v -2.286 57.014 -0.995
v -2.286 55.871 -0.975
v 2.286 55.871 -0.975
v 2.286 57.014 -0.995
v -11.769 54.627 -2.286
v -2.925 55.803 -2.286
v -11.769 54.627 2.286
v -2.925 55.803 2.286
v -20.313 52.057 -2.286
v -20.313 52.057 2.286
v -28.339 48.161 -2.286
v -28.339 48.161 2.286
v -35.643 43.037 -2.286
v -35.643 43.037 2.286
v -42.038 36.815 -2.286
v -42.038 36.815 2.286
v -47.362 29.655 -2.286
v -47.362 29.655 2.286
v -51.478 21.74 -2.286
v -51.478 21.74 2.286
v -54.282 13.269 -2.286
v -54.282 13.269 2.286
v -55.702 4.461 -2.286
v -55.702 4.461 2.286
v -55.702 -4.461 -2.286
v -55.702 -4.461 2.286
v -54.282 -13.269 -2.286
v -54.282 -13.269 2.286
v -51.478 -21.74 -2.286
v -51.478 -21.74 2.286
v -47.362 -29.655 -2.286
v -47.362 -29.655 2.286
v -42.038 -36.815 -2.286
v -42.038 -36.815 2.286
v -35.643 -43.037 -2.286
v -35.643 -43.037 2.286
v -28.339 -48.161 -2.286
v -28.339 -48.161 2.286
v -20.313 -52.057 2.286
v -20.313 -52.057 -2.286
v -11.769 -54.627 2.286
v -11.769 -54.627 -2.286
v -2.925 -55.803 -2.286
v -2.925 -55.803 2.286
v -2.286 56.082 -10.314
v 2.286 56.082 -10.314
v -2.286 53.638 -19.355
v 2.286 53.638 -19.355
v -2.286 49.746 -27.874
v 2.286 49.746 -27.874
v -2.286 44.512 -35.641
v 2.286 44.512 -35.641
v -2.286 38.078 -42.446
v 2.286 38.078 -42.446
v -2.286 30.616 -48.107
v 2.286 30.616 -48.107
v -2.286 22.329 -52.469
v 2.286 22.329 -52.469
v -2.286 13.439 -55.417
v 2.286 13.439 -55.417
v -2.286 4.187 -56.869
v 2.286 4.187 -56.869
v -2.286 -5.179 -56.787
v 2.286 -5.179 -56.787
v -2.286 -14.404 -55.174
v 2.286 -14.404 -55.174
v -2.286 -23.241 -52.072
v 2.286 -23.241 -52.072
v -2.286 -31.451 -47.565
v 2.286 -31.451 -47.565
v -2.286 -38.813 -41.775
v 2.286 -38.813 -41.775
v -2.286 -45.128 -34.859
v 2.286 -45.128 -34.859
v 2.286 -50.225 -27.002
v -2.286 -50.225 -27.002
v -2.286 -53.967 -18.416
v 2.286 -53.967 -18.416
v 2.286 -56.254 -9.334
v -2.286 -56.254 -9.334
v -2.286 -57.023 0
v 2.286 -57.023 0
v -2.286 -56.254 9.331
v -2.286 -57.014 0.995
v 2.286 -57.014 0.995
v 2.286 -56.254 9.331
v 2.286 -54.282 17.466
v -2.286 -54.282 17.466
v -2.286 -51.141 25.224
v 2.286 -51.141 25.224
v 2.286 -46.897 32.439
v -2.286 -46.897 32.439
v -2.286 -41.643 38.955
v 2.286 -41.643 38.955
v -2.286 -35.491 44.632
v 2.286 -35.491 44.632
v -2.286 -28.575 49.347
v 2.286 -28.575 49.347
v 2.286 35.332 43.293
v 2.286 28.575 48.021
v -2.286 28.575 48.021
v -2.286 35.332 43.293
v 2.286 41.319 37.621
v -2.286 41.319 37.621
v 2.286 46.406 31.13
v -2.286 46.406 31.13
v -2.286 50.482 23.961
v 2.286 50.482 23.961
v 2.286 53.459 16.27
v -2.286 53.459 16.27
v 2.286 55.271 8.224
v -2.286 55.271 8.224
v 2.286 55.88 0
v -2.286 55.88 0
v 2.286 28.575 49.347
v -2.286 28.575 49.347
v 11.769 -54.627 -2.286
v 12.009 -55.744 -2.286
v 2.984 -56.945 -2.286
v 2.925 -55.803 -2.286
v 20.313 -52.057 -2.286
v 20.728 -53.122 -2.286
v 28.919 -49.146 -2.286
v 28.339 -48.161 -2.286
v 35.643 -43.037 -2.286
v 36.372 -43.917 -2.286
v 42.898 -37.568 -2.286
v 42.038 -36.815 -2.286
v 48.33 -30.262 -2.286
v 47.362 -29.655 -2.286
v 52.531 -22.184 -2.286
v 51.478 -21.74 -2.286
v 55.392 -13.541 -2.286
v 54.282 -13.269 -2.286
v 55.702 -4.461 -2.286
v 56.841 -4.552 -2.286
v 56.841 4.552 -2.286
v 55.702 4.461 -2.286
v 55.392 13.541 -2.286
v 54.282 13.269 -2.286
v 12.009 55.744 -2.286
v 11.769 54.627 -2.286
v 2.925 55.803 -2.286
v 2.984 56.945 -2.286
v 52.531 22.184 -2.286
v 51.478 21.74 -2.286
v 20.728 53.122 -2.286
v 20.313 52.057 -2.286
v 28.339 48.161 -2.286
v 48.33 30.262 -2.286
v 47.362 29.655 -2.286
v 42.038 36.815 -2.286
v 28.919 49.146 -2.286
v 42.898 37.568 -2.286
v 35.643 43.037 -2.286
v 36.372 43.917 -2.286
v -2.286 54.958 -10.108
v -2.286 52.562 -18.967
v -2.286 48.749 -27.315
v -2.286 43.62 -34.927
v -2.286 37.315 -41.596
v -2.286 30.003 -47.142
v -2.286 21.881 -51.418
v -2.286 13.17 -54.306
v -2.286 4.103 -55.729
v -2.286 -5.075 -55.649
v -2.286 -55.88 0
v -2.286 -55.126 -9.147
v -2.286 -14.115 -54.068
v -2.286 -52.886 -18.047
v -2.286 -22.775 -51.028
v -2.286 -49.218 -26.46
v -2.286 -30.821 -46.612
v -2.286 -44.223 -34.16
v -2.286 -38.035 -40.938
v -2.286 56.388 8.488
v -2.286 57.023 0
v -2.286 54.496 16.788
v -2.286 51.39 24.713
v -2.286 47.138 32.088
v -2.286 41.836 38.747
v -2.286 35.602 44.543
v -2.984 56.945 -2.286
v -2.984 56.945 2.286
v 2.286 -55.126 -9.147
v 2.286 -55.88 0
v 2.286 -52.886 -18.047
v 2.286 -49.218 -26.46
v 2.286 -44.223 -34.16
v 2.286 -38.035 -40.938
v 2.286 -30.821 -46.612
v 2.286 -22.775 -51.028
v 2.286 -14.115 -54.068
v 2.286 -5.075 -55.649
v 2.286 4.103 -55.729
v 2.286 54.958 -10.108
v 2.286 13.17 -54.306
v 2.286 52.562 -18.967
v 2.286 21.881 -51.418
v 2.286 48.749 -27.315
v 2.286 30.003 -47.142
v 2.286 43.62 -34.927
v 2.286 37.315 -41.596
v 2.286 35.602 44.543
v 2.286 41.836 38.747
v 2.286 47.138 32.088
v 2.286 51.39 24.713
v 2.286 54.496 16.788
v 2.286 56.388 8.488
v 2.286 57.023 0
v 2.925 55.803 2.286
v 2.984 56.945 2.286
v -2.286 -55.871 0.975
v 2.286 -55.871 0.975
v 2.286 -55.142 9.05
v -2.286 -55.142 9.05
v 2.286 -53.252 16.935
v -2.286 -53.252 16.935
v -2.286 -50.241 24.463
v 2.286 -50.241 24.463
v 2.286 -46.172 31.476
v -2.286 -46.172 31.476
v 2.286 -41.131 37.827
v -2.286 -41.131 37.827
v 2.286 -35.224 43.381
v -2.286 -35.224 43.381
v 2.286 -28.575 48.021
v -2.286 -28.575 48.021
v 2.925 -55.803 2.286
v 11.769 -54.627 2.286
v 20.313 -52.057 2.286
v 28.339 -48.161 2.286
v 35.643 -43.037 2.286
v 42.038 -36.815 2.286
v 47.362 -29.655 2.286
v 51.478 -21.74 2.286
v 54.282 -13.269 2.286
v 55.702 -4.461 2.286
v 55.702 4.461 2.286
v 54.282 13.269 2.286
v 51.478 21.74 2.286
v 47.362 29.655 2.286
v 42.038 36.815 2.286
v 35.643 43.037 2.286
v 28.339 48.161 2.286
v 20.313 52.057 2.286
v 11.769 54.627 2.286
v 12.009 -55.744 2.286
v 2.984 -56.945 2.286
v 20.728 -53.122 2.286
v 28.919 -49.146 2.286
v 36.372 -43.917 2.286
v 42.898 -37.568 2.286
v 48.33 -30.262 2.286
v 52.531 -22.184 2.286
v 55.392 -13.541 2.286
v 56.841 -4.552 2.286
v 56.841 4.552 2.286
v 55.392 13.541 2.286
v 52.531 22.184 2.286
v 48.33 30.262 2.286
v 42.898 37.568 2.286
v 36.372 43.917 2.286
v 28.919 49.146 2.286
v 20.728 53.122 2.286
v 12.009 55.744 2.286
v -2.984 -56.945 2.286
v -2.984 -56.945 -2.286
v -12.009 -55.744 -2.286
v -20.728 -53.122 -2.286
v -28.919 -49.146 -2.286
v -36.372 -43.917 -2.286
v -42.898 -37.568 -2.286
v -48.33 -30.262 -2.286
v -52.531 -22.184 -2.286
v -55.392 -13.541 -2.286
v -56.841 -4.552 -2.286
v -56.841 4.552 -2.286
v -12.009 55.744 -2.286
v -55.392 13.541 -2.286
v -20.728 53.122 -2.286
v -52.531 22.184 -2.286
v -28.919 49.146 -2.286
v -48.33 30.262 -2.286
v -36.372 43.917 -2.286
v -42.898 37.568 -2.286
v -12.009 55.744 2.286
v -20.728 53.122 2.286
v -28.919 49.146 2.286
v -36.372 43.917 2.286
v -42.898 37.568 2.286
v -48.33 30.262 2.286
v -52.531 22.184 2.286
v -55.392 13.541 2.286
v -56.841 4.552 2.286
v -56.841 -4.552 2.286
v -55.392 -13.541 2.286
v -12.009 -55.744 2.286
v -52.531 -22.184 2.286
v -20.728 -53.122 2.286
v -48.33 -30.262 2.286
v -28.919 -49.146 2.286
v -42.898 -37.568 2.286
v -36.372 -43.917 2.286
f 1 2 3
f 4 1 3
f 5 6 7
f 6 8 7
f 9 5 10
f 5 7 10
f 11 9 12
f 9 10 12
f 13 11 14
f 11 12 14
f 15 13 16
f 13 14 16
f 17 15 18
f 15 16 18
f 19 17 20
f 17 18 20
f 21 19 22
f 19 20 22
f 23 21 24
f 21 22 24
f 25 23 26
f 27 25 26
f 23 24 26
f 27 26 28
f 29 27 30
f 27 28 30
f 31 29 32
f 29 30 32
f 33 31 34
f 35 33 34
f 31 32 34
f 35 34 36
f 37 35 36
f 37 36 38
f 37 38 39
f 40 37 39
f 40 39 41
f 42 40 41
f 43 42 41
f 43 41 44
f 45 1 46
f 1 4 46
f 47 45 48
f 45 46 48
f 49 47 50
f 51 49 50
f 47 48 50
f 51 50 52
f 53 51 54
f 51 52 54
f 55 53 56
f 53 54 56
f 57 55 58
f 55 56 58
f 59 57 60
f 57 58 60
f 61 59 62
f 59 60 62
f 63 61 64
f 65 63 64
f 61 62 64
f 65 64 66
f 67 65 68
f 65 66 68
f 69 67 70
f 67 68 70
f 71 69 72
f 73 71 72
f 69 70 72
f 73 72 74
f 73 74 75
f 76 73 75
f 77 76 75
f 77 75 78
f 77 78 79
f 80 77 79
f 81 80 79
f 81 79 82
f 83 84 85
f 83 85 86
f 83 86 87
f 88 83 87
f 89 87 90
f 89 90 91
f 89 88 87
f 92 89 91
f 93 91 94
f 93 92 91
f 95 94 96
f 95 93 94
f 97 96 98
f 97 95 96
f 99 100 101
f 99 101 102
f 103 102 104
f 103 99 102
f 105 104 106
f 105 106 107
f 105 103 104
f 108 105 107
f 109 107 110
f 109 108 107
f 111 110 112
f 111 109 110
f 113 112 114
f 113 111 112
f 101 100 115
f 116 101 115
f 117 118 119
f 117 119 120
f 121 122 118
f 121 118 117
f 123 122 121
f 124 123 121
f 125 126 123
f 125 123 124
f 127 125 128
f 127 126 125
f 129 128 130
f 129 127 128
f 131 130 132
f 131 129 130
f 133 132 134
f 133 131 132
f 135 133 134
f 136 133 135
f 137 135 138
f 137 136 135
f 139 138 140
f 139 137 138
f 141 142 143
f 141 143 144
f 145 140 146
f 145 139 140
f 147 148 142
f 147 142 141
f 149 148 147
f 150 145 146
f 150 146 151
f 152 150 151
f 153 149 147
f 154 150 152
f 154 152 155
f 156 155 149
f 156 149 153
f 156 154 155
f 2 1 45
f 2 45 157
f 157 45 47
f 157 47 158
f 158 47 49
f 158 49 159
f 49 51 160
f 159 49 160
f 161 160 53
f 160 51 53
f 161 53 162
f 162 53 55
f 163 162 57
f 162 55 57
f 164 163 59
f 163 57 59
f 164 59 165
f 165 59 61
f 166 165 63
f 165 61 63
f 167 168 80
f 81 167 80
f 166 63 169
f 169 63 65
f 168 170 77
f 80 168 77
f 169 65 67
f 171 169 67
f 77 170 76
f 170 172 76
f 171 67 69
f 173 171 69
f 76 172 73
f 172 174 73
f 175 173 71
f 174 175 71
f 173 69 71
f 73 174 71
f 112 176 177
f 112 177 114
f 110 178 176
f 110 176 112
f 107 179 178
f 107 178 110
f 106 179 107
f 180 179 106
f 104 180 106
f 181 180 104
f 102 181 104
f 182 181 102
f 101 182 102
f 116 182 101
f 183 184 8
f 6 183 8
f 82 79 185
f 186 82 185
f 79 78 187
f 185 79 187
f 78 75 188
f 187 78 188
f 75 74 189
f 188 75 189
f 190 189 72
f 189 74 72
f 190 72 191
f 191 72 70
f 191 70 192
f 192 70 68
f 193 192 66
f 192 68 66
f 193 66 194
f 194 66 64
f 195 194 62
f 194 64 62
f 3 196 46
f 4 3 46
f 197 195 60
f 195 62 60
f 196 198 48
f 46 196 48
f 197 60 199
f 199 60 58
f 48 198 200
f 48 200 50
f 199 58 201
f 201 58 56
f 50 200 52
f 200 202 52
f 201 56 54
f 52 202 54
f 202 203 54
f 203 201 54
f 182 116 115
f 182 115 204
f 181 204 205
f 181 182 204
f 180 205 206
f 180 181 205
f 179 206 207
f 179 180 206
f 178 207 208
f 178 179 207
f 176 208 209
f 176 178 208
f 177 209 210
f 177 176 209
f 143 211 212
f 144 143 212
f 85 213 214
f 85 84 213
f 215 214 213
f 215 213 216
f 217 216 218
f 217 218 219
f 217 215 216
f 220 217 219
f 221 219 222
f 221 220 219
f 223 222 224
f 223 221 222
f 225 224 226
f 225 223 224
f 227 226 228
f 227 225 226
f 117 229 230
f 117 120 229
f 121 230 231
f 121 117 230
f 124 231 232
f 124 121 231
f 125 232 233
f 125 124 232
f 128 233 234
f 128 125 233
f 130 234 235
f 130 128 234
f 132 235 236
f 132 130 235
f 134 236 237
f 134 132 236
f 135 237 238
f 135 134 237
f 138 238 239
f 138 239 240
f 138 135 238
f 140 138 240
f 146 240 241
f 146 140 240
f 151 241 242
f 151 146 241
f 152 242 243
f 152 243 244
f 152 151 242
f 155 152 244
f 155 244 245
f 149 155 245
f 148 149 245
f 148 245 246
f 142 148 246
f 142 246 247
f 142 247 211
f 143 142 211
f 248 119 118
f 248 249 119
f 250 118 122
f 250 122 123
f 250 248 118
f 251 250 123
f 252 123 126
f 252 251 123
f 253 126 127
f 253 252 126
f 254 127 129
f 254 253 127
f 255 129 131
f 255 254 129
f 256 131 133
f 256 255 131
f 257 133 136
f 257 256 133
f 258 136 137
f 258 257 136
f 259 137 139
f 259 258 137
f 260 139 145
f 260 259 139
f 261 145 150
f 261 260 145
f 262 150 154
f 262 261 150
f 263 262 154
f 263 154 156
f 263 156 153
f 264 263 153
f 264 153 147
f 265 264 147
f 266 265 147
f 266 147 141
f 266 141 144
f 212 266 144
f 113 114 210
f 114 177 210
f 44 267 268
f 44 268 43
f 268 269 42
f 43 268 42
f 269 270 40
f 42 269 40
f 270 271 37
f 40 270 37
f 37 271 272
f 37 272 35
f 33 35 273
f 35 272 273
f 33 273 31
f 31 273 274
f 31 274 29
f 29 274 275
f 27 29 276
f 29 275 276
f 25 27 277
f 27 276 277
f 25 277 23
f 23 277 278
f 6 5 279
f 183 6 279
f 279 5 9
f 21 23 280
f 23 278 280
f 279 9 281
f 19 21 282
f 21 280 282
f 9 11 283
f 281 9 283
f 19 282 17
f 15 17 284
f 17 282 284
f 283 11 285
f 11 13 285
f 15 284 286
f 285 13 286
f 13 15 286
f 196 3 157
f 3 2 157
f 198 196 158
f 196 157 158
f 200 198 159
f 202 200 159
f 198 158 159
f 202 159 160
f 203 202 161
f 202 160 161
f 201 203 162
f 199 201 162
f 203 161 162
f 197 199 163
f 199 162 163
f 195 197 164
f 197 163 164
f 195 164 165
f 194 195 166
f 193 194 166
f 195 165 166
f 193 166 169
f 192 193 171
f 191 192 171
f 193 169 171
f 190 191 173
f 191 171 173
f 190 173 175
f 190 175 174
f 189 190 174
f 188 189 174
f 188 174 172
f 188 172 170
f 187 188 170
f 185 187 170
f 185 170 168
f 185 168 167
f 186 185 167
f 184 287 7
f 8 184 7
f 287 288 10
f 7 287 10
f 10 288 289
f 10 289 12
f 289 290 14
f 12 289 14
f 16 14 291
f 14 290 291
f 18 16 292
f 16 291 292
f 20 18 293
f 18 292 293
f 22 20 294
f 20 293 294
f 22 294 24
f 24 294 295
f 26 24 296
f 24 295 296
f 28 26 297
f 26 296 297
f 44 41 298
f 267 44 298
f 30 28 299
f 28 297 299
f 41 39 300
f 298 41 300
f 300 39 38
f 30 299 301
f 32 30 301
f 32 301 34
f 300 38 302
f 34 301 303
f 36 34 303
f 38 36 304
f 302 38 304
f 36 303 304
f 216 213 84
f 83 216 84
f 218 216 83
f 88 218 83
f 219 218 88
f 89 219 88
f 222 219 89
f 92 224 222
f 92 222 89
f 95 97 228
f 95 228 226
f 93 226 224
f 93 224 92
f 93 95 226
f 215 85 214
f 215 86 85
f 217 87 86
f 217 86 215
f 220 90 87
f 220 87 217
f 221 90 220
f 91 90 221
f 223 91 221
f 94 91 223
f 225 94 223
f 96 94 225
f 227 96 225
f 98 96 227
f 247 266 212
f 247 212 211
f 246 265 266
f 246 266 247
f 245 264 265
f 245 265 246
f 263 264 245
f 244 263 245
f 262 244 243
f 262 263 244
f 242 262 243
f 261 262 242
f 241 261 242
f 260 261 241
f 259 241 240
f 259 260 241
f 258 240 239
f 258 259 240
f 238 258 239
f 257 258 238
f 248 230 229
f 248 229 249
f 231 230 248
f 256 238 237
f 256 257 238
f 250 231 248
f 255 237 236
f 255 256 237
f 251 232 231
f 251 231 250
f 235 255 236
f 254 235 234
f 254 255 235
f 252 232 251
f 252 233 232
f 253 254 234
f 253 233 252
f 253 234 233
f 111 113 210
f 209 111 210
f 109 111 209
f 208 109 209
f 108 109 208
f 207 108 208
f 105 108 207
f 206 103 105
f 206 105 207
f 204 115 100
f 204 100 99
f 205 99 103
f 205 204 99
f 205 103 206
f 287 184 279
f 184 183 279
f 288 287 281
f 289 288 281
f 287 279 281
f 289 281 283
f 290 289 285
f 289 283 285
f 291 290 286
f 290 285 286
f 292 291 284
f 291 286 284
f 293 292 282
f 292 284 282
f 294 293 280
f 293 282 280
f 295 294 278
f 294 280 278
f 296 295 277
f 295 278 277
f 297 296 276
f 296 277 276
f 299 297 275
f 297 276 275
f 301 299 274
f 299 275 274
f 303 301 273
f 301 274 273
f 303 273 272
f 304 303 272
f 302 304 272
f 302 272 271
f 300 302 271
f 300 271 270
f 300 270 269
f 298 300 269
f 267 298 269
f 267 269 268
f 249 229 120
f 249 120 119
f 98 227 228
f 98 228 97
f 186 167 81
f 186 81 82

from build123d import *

# Parameters (mm, degrees)
F1_ANGLE_BACK = 89
F1_ANGLE      = 179
F2_ANGLE_BACK = 87
F2_ANGLE      = 174
F3_W          = 28.575
F3_H          = 19.05
F4_DEPTH      = 12.7


with BuildPart() as f1:
    # F0 (on Front) → F1 (revolve)
    with BuildSketch(Plane.XZ, mode=Mode.PRIVATE) as f1_sk:
        Polygon((2.286, -55.88), (0, -55.88), (-2.286, -55.88), (-2.286, -57.023), (2.286, -57.023), align=None)
    revolve(f1_sk.sketch.rotate(Axis((-27.94, 0, 0), (-1, 0, 0)), -F1_ANGLE_BACK), axis=Axis((-27.94, 0, 0), (-1, 0, 0)), revolution_arc=F1_ANGLE)


with BuildPart() as f1b:
    # F0 (on Front) → F1, piece 2 (revolve)
    with BuildSketch(Plane.XZ, mode=Mode.PRIVATE) as f1_sk:
        Polygon((-2.286, 55.88), (0, 55.88), (2.286, 55.88), (2.286, 57.023), (-2.286, 57.023), align=None)
    revolve(f1_sk.sketch.rotate(Axis((-27.94, 0, 0), (-1, 0, 0)), -F1_ANGLE_BACK), axis=Axis((-27.94, 0, 0), (-1, 0, 0)), revolution_arc=F1_ANGLE)

    # F3 (on Right) → F4 (cut, symmetric)
    with BuildSketch(Plane.YZ):
        with Locations((-14.2875, 51.435)):
            Rectangle(F3_W, F3_H)
        with Locations((14.2875, 51.435)):
            Rectangle(F3_W, F3_H)
    extrude(amount=F4_DEPTH, both=True, mode=Mode.SUBTRACT)


with BuildPart() as f2:
    # F0 (on Front) → F2 (revolve)
    with BuildSketch(Plane.XZ, mode=Mode.PRIVATE) as f2_sk:
        Polygon((-55.88, -2.286), (-55.88, 0), (-55.88, 2.286), (-57.023, 2.286), (-57.023, -2.286), align=None)
    revolve(f2_sk.sketch.rotate(Axis((0, 0, 27.94), (0, 0, 1)), -F2_ANGLE_BACK), axis=Axis((0, 0, 27.94), (0, 0, 1)), revolution_arc=F2_ANGLE)


with BuildPart() as f2b:
    # F0 (on Front) → F2, piece 2 (revolve)
    with BuildSketch(Plane.XZ, mode=Mode.PRIVATE) as f2_sk:
        Polygon((55.88, 2.286), (55.88, 0), (55.88, -2.286), (57.023, -2.286), (57.023, 2.286), align=None)
    revolve(f2_sk.sketch.rotate(Axis((0, 0, 27.94), (0, 0, 1)), -F2_ANGLE_BACK), axis=Axis((0, 0, 27.94), (0, 0, 1)), revolution_arc=F2_ANGLE)


solid = Compound([f1.part, f1b.part, f2.part, f2b.part])
